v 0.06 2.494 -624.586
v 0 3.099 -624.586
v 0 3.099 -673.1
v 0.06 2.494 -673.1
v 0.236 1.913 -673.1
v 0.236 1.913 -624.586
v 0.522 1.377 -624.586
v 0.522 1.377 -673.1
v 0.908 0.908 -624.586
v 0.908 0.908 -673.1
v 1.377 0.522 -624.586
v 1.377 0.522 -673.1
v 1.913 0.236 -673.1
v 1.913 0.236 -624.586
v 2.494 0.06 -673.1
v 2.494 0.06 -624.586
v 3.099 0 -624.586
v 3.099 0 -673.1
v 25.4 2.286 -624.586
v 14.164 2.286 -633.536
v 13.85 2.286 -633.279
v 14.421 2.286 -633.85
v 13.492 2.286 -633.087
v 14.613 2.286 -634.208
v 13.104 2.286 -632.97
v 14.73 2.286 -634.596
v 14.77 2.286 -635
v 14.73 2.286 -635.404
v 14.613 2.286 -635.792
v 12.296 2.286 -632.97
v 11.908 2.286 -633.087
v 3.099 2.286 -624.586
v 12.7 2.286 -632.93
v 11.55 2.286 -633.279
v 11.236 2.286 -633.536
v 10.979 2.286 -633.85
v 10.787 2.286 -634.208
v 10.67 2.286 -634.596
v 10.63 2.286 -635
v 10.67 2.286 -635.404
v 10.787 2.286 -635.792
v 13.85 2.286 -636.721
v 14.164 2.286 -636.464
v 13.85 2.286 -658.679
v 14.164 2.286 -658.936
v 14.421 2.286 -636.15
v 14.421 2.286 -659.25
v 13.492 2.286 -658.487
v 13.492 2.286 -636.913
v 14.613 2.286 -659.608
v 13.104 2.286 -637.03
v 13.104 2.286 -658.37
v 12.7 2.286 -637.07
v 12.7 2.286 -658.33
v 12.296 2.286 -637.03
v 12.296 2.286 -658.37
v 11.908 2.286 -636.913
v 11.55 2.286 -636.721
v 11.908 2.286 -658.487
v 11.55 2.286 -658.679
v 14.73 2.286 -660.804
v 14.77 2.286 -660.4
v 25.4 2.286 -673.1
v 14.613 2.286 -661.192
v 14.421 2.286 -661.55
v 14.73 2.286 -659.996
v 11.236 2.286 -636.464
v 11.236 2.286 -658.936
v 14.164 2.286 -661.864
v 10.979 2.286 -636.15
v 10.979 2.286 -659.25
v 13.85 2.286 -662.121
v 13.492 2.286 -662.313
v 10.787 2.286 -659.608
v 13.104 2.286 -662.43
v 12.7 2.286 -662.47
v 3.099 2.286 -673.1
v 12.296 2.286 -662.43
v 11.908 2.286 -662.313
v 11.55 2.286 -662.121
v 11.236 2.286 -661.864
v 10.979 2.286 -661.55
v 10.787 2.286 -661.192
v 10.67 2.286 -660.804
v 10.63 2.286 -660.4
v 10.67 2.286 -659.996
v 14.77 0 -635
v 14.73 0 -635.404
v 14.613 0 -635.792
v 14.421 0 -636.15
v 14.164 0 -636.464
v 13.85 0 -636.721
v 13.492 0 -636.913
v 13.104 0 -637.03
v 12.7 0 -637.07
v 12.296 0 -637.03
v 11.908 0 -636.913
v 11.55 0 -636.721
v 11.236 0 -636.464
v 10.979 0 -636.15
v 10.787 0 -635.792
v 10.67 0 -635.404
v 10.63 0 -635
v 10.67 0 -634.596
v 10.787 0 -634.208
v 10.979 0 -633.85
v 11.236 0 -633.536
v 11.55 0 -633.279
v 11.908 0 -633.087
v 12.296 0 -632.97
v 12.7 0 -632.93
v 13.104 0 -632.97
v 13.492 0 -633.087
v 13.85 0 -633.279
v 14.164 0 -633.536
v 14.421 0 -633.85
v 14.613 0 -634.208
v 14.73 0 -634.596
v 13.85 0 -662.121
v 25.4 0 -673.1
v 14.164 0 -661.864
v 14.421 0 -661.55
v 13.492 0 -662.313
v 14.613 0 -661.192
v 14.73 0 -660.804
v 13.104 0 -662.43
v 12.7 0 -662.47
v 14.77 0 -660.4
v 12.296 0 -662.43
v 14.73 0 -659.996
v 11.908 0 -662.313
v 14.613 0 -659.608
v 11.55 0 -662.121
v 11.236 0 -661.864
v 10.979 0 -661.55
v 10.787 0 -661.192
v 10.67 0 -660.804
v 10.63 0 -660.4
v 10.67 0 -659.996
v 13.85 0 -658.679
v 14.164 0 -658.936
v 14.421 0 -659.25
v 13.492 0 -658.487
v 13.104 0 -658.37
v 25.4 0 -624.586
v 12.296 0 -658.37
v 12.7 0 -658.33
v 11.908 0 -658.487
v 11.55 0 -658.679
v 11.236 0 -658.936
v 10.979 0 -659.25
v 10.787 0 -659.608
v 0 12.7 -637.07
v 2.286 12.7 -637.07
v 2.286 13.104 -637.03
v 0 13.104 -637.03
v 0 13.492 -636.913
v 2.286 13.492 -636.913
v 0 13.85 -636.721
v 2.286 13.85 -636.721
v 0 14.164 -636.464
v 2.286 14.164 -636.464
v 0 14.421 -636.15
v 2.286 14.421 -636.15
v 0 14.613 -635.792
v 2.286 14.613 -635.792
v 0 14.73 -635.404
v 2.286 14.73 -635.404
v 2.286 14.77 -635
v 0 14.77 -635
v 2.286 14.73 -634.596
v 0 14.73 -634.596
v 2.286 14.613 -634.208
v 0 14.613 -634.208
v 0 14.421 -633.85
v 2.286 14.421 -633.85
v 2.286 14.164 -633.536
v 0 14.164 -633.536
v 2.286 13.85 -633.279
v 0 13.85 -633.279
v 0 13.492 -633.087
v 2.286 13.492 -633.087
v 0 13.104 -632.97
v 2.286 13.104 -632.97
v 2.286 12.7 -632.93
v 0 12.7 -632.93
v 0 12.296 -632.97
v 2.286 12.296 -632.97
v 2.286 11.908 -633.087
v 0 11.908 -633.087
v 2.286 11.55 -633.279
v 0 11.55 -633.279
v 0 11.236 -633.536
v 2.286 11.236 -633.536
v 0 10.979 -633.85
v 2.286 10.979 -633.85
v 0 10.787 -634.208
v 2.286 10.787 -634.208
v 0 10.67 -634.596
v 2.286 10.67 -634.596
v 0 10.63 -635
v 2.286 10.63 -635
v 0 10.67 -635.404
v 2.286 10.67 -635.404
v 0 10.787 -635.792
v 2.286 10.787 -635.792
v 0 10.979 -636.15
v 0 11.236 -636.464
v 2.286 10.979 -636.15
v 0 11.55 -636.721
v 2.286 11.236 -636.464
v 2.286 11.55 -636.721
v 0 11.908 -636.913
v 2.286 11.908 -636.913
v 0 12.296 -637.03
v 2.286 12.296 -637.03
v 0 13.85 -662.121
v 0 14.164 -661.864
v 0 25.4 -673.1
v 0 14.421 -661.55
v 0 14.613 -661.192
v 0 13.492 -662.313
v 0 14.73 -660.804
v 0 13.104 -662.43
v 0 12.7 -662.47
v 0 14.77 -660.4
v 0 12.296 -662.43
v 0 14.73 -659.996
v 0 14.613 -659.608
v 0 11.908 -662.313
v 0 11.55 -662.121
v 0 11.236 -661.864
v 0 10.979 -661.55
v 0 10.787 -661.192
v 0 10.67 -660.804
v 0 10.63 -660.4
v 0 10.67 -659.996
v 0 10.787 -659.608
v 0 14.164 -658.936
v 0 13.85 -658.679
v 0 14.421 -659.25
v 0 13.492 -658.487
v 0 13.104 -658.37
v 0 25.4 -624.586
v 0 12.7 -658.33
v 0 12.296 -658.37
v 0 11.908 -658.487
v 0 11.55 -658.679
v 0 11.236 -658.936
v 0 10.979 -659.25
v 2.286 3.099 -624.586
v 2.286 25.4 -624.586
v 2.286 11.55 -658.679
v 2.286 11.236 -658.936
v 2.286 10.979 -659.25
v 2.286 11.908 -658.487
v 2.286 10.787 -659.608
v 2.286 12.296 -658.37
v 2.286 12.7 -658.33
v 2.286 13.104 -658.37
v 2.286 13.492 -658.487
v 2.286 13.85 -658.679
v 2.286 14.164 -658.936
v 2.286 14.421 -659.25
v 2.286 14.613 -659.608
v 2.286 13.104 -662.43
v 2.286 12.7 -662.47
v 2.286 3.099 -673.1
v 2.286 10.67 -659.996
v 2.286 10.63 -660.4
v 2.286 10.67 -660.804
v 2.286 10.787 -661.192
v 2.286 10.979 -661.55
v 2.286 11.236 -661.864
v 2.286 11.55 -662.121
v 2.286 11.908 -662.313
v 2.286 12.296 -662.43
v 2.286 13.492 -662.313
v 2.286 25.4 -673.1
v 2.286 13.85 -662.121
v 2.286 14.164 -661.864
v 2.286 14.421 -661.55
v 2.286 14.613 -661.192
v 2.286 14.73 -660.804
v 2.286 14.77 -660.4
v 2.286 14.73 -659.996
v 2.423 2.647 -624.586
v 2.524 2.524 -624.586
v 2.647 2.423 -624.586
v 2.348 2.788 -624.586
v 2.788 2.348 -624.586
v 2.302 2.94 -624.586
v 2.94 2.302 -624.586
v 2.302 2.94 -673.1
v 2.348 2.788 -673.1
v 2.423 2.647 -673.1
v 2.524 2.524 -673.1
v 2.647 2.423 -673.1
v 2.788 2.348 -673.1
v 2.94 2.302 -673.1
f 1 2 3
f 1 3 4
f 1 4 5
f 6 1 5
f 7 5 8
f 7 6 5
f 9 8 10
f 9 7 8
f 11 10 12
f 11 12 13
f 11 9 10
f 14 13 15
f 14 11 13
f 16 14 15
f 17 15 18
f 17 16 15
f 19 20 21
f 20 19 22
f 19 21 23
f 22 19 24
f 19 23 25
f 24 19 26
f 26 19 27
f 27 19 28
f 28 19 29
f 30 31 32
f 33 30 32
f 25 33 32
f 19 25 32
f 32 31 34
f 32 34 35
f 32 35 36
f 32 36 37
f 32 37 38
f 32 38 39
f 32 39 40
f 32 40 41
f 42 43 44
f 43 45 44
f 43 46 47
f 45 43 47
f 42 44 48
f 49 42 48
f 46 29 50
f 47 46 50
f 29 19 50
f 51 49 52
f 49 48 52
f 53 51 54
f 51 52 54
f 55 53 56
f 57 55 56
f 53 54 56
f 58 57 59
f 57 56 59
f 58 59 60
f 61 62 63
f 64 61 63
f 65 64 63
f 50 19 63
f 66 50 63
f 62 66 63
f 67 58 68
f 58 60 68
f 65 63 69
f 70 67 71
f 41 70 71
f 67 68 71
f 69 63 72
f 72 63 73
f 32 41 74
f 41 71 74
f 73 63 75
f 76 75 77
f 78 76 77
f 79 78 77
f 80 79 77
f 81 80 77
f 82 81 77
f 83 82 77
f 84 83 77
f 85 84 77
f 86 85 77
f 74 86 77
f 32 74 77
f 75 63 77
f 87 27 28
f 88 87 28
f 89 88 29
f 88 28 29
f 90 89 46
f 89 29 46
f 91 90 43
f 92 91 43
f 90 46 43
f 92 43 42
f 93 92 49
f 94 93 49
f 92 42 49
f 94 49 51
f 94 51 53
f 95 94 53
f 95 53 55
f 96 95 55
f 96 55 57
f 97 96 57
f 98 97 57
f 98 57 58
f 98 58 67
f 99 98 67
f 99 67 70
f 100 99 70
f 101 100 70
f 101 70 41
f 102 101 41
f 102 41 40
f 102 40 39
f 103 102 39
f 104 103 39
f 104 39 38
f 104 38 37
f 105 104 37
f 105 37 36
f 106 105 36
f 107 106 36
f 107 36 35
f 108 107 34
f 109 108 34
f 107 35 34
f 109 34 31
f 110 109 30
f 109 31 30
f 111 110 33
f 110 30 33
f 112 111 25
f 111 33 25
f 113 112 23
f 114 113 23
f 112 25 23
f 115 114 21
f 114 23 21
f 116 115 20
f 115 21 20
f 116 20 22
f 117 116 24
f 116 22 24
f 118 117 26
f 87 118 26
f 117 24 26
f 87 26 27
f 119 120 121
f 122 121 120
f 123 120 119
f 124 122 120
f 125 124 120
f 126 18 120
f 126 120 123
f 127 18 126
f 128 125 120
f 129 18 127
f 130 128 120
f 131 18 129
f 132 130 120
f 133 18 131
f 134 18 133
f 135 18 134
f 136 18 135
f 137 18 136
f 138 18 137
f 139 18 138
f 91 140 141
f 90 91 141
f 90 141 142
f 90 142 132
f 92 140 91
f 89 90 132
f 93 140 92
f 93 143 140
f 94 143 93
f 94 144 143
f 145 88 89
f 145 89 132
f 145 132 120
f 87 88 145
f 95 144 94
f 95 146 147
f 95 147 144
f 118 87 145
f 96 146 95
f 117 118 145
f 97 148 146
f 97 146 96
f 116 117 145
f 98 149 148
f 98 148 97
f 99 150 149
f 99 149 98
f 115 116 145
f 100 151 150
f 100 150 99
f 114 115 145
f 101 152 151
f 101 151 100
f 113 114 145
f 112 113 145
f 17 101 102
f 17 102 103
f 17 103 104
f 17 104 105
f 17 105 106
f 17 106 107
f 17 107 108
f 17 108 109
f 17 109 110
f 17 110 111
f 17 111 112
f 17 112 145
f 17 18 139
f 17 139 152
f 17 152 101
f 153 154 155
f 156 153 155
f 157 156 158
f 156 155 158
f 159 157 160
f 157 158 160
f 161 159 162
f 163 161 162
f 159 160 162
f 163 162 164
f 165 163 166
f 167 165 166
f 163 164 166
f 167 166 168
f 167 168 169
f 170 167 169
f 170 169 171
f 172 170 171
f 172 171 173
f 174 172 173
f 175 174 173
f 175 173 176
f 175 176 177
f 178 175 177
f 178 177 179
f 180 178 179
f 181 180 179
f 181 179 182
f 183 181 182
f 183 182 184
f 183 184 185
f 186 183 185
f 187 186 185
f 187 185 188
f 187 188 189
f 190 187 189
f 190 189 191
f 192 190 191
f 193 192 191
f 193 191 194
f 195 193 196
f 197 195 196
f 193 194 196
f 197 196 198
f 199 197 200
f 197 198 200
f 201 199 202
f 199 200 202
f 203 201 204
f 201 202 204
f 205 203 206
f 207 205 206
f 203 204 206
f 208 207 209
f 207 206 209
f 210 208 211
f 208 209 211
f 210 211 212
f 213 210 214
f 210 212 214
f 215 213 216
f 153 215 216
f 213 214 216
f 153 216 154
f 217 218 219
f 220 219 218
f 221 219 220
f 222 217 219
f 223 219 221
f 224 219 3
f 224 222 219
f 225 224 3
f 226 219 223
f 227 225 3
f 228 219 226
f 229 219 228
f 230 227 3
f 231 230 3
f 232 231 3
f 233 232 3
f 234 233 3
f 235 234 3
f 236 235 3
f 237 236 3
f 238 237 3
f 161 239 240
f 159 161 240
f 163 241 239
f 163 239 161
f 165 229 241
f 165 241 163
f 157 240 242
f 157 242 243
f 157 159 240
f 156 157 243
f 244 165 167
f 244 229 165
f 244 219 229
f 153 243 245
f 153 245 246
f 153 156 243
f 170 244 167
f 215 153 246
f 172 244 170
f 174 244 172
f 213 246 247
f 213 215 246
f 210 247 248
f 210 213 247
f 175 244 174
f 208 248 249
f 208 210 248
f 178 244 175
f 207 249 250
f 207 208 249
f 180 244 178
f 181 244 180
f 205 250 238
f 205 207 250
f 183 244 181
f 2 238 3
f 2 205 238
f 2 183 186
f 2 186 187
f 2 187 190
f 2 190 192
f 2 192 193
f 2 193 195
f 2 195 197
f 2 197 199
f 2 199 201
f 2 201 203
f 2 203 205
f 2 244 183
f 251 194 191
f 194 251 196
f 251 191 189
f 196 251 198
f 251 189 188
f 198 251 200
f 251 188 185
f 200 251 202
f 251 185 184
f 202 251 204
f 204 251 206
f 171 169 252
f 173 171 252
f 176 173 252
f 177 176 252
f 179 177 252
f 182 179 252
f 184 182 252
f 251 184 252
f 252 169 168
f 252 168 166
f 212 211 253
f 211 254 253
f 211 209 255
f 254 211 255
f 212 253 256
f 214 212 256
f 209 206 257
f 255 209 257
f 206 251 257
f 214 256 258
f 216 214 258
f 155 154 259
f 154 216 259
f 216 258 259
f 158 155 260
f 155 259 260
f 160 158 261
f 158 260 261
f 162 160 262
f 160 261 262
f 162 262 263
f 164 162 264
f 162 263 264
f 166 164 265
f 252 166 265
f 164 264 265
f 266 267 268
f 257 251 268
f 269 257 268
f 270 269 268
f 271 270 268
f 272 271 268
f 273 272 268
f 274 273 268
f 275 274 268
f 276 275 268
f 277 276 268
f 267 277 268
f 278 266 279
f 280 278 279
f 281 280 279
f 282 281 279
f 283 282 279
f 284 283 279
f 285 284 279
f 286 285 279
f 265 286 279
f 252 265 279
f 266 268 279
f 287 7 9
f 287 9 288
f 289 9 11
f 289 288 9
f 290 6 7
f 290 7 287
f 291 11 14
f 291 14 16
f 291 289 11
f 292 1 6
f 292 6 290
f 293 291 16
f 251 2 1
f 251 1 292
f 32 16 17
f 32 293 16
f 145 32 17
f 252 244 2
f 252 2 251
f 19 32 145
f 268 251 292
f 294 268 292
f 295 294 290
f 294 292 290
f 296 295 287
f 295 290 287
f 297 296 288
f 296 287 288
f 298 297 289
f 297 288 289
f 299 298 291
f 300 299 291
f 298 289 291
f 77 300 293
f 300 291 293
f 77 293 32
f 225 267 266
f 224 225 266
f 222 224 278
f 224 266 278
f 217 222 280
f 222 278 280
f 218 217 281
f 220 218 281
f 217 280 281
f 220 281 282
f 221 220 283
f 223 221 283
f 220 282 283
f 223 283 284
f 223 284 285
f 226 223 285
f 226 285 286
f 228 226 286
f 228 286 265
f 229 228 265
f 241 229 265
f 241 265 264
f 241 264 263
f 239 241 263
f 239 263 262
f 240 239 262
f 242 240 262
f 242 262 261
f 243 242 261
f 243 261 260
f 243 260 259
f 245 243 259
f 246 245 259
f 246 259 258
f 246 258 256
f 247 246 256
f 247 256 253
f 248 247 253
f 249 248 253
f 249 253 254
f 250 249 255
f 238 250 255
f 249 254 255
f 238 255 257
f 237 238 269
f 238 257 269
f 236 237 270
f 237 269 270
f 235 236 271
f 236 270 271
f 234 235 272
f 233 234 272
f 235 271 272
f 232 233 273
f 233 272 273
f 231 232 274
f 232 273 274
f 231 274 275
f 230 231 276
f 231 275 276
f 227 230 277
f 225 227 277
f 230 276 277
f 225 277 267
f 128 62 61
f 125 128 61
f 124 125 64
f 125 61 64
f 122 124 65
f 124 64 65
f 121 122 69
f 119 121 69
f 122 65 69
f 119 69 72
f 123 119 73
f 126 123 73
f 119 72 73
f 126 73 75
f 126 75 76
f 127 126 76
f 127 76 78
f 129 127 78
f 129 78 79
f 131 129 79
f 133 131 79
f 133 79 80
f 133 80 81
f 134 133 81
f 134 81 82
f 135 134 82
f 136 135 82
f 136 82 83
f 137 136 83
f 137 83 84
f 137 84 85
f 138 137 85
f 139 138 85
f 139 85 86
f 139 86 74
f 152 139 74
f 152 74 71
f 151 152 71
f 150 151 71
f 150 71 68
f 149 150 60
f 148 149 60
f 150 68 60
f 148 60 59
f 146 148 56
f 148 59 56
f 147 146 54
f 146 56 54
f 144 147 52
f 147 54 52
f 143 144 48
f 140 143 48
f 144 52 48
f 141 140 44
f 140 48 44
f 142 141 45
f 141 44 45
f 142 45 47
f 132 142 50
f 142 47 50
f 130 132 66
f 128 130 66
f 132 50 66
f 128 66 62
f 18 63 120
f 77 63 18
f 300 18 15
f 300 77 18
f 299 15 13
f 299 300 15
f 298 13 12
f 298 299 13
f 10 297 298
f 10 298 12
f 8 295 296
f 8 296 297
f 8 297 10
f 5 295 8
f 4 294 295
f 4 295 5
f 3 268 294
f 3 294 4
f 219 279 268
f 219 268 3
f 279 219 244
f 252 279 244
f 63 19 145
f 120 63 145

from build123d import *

# Parameters (mm, degrees)
SKETCH1_W                  = 25.4
SKETCH1_H                  = 1498.6
BOSS_EXTRUDE1_DEPTH        = 25.4
SKETCH2_W                  = 23.114
SKETCH2_H                  = 23.114
CUT_EXTRUDE1_DEPTH         = 1499.6
M3_5_CLEARANCE_HOLE1_D     = 4.1402
M3_5_CLEARANCE_HOLE1_DEPTH = 25.4
M3_5_CLEARANCE_HOLE2_D     = 4.1402
M3_5_CLEARANCE_HOLE2_DEPTH = 25.4
CHAMFER1_SIZE              = 2.159
FILLET1_R                  = 0.8128
FILLET2_R                  = 3.0988
SKETCH8_W                  = 95.882963774
SKETCH8_H                  = 79.338329604
CUT_EXTRUDE3_DEPTH         = 1371.6
SKETCH9_W                  = 56.924523055
SKETCH9_H                  = 51.282783217
CUT_EXTRUDE4_DEPTH         = 76.2
SKETCH11_W                 = 51.462522779
SKETCH11_H                 = 66.676735099
CUT_EXTRUDE6_DEPTH         = 2.286


with BuildPart() as part:
    # Sketch1 → Boss-Extrude1 (new body)
    with BuildSketch(Plane(origin=(0, 0, 0), x_dir=(0, -1, 0), z_dir=(-1, 0, 0))):
        with Locations((-12.7, 0)):
            Rectangle(SKETCH1_W, SKETCH1_H)
    extrude(amount=-BOSS_EXTRUDE1_DEPTH)

    # Sketch2 → Cut-Extrude1 (cut, through all)
    with BuildSketch(Plane(origin=(0, 0, -749.3), x_dir=(-1, 0, 0), z_dir=(0, 0, -1))):
        with Locations((-13.843, 13.843)):
            Rectangle(SKETCH2_W, SKETCH2_H)
    extrude(amount=-CUT_EXTRUDE1_DEPTH, mode=Mode.SUBTRACT)

    # M3.5 Clearance Hole1
    with Locations(Plane(origin=(0, 0, 0), x_dir=(-1, 0, 0), z_dir=(0, -1, 0))):
        with Locations((-12.7, 736.6), (-12.7, 711.2), (-12.7, 685.8), (-12.7, 660.4), (-12.7, 635), (-12.7, 609.6), (-12.7, 584.2), (-12.7, 558.8), (-12.7, 533.4), (-12.7, 508), (-12.7, 482.6), (-12.7, 457.2), (-12.7, 431.8), (-12.7, 406.4), (-12.7, 381), (-12.7, 355.6), (-12.7, 330.2), (-12.7, 304.8), (-12.7, 279.4), (-12.7, 254), (-12.7, 228.6), (-12.7, 203.2), (-12.7, 177.8), (-12.7, 152.4), (-12.7, 127), (-12.7, 101.6), (-12.7, 76.2), (-12.7, 50.8), (-12.7, 25.4), (-12.7, 0), (-12.7, -25.4), (-12.7, -50.8), (-12.7, -76.2), (-12.7, -101.6), (-12.7, -127), (-12.7, -152.4), (-12.7, -177.8), (-12.7, -203.2), (-12.7, -228.6), (-12.7, -254), (-12.7, -279.4), (-12.7, -304.8), (-12.7, -330.2), (-12.7, -355.6), (-12.7, -381), (-12.7, -406.4), (-12.7, -431.8), (-12.7, -457.2), (-12.7, -482.6), (-12.7, -508), (-12.7, -533.4), (-12.7, -558.8), (-12.7, -584.2), (-12.7, -609.6), (-12.7, -635), (-12.7, -660.4), (-12.7, -685.8), (-12.7, -711.2), (-12.7, -736.6)):
            Hole(M3_5_CLEARANCE_HOLE1_D / 2, depth=M3_5_CLEARANCE_HOLE1_DEPTH)

    # M3.5 Clearance Hole2
    with Locations(Plane.ZY):
        with Locations((711.2, 12.7), (736.6, 12.7), (685.8, 12.7), (660.4, 12.7), (635, 12.7), (609.6, 12.7), (584.2, 12.7), (558.8, 12.7), (533.4, 12.7), (508, 12.7), (482.6, 12.7), (457.2, 12.7), (431.8, 12.7), (406.4, 12.7), (381, 12.7), (355.6, 12.7), (330.2, 12.7), (304.8, 12.7), (279.4, 12.7), (254, 12.7), (228.6, 12.7), (203.2, 12.7), (177.8, 12.7), (152.4, 12.7), (127, 12.7), (101.6, 12.7), (76.2, 12.7), (50.8, 12.7), (25.4, 12.7), (0, 12.7), (-25.4, 12.7), (-50.8, 12.7), (-76.2, 12.7), (-101.6, 12.7), (-127, 12.7), (-152.4, 12.7), (-177.8, 12.7), (-203.2, 12.7), (-228.6, 12.7), (-254, 12.7), (-279.4, 12.7), (-304.8, 12.7), (-330.2, 12.7), (-355.6, 12.7), (-381, 12.7), (-406.4, 12.7), (-431.8, 12.7), (-457.2, 12.7), (-482.6, 12.7), (-508, 12.7), (-533.4, 12.7), (-558.8, 12.7), (-584.2, 12.7), (-609.6, 12.7), (-635, 12.7), (-660.4, 12.7), (-685.8, 12.7), (-711.2, 12.7), (-736.6, 12.7)):
            Hole(M3_5_CLEARANCE_HOLE2_D / 2, depth=M3_5_CLEARANCE_HOLE2_DEPTH)

    # Chamfer1
    chamfer1_edges = [part.edges().sort_by_distance(p)[0] for p in [
        (25.4, 1.143, -749.3),
        (1.143, 25.4, 749.3),
        (1.143, 25.4, -749.3),
        (25.4, 1.143, 749.3),
    ]]
    chamfer(chamfer1_edges, length=CHAMFER1_SIZE)

    # Fillet1
    fillet1_edges = [part.edges().sort_by_distance(p)[0] for p in [
        (2.286, 2.286, 0),
    ]]
    fillet(fillet1_edges, radius=FILLET1_R)

    # Fillet2
    fillet2_edges = [part.edges().sort_by_distance(p)[0] for p in [
        (0, 0, 0),
    ]]
    fillet(fillet2_edges, radius=FILLET2_R)

    # Sketch8 → Cut-Extrude3 (cut)
    with BuildSketch(Plane.XY.offset(749.3)):
        with Locations((2.286, 3.0988)):
            Rectangle(SKETCH8_W, SKETCH8_H)
    extrude(amount=-CUT_EXTRUDE3_DEPTH, mode=Mode.SUBTRACT)

    # Sketch9 → Cut-Extrude4 (cut)
    with BuildSketch(Plane(origin=(0, 0, -749.3), x_dir=(-1, 0, 0), z_dir=(0, 0, -1))):
        with Locations((-2.180776643, 1.30746368)):
            Rectangle(SKETCH9_W, SKETCH9_H)
    extrude(amount=-CUT_EXTRUDE4_DEPTH, mode=Mode.SUBTRACT)

    # Sketch11 → Cut-Extrude6 (cut)
    with BuildSketch(Plane.XY.offset(-622.3)):
        with Locations((1.85517497, 1.74884985)):
            Rectangle(SKETCH11_W, SKETCH11_H)
    extrude(amount=-CUT_EXTRUDE6_DEPTH, mode=Mode.SUBTRACT)


solid = part.part
